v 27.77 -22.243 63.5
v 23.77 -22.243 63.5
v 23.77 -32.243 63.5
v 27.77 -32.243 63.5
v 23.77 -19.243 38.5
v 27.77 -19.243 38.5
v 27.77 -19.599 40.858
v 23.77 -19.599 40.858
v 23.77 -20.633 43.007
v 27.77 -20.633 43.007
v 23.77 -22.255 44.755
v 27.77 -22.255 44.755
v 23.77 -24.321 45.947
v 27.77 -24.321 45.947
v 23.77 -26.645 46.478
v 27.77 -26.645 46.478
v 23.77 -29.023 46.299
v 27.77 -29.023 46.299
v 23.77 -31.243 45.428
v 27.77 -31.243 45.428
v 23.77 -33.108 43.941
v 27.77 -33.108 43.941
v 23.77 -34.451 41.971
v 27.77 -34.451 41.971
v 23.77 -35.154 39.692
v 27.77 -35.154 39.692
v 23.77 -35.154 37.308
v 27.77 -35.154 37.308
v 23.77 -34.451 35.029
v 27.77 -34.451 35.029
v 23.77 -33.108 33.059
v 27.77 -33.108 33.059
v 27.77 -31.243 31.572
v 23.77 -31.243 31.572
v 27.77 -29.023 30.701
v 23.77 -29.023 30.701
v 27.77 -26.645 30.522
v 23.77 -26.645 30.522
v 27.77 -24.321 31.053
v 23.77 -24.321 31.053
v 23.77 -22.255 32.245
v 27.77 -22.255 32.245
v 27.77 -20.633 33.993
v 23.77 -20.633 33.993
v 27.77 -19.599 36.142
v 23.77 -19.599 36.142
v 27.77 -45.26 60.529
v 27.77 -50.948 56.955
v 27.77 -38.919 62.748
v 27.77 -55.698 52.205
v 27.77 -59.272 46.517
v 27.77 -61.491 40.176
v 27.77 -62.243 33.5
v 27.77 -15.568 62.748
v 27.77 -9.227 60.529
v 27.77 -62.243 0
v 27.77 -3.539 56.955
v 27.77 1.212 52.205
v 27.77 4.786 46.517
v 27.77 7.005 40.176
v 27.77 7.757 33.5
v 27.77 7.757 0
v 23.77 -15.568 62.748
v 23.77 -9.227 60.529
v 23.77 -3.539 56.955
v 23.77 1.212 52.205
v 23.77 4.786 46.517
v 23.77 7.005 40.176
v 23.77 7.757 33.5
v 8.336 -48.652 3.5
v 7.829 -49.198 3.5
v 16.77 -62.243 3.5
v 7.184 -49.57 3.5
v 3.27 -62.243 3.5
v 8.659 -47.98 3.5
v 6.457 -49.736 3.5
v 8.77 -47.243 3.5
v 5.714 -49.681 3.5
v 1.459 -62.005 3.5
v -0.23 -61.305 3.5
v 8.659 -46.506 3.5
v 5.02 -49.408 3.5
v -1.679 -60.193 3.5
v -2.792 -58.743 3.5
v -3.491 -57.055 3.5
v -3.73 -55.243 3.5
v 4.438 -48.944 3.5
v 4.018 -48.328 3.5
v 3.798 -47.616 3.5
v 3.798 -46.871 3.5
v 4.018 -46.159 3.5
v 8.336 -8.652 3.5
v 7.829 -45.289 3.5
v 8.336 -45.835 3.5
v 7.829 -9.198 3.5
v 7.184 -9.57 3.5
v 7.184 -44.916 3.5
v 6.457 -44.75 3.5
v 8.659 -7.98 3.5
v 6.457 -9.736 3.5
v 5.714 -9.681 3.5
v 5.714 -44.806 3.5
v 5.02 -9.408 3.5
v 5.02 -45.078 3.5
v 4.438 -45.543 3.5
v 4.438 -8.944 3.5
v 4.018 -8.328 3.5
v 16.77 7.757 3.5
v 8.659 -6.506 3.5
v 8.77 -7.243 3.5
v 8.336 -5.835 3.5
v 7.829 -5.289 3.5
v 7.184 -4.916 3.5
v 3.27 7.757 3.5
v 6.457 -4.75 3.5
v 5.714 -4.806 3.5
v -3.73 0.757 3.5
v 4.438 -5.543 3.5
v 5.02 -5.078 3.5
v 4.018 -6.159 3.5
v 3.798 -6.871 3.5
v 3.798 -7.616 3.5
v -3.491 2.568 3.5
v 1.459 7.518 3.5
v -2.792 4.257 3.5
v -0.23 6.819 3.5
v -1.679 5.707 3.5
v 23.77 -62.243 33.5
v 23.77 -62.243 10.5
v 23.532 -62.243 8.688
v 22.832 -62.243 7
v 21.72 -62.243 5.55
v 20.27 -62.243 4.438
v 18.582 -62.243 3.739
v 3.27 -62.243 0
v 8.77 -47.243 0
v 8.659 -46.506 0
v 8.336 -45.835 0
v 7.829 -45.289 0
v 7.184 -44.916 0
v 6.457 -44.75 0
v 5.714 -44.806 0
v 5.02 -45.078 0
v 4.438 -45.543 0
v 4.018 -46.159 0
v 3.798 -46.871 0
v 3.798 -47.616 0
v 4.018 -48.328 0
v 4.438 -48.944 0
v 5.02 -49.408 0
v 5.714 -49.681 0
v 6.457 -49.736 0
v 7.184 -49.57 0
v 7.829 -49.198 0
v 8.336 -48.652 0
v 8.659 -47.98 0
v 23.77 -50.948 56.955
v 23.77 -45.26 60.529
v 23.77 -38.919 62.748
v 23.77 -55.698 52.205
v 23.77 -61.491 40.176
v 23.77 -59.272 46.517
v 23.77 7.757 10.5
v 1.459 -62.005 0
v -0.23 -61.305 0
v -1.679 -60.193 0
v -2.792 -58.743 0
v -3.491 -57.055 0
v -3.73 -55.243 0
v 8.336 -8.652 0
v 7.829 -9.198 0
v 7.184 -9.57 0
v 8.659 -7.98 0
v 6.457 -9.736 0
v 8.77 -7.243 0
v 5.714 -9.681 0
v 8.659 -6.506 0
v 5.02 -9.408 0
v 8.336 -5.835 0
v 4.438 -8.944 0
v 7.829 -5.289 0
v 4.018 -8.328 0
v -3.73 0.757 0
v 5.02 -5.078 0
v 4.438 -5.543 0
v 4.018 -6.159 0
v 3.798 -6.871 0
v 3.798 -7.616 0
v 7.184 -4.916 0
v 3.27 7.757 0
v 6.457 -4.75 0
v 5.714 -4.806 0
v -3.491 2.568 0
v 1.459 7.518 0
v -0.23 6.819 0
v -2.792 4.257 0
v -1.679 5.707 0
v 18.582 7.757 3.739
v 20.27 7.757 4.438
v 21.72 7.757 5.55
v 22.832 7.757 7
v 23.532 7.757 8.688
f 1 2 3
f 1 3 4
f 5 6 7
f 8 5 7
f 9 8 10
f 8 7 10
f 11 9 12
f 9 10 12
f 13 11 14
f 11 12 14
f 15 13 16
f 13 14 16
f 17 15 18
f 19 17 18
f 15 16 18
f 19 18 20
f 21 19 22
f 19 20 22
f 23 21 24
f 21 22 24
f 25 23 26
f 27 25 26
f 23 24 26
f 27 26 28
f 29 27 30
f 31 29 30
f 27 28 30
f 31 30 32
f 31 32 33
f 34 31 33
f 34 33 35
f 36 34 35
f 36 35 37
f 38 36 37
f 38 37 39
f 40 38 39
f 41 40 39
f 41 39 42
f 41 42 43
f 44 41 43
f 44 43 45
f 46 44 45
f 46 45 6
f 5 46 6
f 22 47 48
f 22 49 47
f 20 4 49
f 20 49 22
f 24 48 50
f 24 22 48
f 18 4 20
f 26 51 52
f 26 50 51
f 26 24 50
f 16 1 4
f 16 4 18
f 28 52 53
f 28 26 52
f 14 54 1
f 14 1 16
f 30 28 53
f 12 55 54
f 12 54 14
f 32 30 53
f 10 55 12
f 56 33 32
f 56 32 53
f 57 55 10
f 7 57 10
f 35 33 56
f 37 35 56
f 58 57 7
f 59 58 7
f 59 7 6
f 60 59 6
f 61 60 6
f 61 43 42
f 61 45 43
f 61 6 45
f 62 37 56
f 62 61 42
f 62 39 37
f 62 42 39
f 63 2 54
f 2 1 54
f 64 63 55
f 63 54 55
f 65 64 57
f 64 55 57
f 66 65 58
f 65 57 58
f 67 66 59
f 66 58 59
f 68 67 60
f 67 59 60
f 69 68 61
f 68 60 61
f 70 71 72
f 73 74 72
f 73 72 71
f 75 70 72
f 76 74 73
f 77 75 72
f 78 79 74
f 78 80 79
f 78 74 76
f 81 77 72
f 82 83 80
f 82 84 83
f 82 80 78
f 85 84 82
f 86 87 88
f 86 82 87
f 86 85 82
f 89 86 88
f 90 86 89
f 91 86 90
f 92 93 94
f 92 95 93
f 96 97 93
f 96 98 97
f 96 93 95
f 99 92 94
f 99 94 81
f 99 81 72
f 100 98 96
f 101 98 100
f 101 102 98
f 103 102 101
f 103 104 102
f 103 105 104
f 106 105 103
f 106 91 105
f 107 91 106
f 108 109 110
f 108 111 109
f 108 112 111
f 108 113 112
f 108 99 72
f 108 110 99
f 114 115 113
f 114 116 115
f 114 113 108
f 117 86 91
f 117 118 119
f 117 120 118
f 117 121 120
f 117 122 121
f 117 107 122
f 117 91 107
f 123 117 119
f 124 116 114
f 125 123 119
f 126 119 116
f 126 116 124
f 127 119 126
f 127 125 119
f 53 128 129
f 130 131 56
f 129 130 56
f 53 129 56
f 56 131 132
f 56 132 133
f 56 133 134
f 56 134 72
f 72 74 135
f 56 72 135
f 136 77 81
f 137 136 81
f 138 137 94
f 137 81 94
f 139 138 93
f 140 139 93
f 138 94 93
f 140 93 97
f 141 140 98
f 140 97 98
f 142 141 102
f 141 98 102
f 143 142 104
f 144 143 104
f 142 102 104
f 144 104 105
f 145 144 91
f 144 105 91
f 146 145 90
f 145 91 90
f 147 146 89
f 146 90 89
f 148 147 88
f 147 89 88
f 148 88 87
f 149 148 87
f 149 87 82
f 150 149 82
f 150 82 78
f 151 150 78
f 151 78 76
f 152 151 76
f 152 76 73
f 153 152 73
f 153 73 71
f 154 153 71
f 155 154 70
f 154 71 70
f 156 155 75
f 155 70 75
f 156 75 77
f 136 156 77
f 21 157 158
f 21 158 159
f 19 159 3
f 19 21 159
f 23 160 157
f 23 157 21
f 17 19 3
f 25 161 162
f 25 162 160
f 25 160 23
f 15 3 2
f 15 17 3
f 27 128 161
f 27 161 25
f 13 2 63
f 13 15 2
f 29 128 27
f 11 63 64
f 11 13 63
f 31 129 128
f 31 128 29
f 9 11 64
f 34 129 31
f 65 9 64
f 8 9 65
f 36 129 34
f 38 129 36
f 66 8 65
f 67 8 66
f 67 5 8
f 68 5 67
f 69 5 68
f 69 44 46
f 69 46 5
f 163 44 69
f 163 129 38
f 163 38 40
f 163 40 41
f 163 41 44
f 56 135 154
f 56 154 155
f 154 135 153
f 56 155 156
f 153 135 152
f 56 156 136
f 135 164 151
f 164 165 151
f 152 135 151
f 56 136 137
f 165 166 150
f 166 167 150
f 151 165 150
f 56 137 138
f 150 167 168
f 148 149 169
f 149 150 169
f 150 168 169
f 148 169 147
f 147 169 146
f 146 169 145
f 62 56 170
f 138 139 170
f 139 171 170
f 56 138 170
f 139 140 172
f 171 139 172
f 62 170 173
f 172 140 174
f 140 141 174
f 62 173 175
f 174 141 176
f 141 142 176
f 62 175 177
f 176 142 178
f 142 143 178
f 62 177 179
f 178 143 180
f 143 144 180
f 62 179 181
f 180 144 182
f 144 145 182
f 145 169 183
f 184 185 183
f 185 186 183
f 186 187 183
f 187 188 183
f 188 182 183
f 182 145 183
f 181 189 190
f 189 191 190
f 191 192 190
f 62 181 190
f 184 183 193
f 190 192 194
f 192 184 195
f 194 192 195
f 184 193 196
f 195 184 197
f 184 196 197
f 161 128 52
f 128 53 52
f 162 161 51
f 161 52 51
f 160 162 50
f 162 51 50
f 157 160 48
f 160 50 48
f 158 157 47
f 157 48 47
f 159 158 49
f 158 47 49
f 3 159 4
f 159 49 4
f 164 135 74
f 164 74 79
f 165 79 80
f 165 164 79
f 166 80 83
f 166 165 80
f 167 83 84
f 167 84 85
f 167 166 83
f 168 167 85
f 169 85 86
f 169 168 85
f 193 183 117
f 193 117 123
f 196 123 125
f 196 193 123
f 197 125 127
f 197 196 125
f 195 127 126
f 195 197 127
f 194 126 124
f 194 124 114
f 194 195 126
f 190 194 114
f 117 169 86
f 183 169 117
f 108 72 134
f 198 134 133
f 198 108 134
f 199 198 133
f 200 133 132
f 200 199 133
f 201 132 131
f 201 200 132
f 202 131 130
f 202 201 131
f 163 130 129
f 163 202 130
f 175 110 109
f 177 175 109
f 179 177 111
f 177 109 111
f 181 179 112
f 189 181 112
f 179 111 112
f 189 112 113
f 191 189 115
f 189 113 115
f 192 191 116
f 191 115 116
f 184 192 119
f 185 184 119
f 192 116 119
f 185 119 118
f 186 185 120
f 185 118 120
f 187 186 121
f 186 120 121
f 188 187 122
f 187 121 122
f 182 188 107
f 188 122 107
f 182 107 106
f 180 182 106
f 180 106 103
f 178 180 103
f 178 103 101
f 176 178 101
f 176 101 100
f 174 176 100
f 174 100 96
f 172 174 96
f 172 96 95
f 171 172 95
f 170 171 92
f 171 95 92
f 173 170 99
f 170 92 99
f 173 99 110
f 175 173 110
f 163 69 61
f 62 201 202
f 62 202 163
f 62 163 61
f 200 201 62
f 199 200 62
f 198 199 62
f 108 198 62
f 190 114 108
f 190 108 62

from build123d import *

# Parameters (mm, degrees)
BOSS_EXTRU_1_DEPTH      = 3.5
ESQUISSE2_R             = 2.5
ENL_V_MAT_EXTRU_1_DEPTH = 3.5
ESQUISSE3_W             = 4
ESQUISSE3_H             = 70
BOSS_EXTRU_2_DEPTH      = 60
ESQUISSE4_R             = 8
ENL_V_MAT_EXTRU_2_DEPTH = 6
CONG_1_R                = 30
ESQUISSE5_W             = 3.5
ESQUISSE5_H             = 70
BOSS_EXTRU_4_DEPTH      = 11.5
CONG_3_R                = 7


with BuildPart() as part:
    # Esquisse1 → Boss.-Extru.1 (new body)
    with BuildSketch(Plane.XY):
        with BuildLine():
            Line((9.27027027, 7.756756757), (16.27027027, 7.756756757))
            Line((16.27027027, 7.756756757), (16.27027027, 0.756756757))
            Line((16.27027027, 0.756756757), (16.27027027, -55.243243243))
            Line((16.27027027, -55.243243243), (16.27027027, -62.243243243))
            Line((16.27027027, -62.243243243), (9.27027027, -62.243243243))
            Line((9.27027027, -62.243243243), (3.27027027, -62.243243243))
            ThreePointArc((3.27027027, -62.243243243), (-1.679477198, -60.192990712), (-3.72972973, -55.243243243))
            Line((-3.72972973, -55.243243243), (-3.72972973, 0.756756757))
            ThreePointArc((-3.72972973, 0.756756757), (-1.679477198, 5.706504225), (3.27027027, 7.756756757))
            Line((3.27027027, 7.756756757), (9.27027027, 7.756756757))
        make_face()
    extrude(amount=BOSS_EXTRU_1_DEPTH)

    # Esquisse2 → Enlèv. mat.-Extru.1 (cut)
    with BuildSketch(Plane.XY.offset(3.5)):
        with Locations((6.27027027, -7.243243243)):
            Circle(ESQUISSE2_R)
        with Locations((6.27027027, -47.243243243)):
            Circle(ESQUISSE2_R)
    extrude(amount=-ENL_V_MAT_EXTRU_1_DEPTH, mode=Mode.SUBTRACT)



with BuildPart() as body_2:
    # Esquisse3 → Boss.-Extru.2 (new body)
    with BuildSketch(Plane.XY.offset(3.5)):
        with Locations((25.77027027, -27.243243243)):
            Rectangle(ESQUISSE3_W, ESQUISSE3_H)
    extrude(amount=BOSS_EXTRU_2_DEPTH)

    # Esquisse4 → Enlèv. mat.-Extru.2 (cut)
    with BuildSketch(Plane(origin=(27.77027027, 0, 0), x_dir=(0, 0, -1), z_dir=(1, 0, 0))):
        with Locations(Location((-38.5, -27.243243243, 0), (0, 0, 90))):
            Circle(ESQUISSE4_R)
    extrude(amount=-ENL_V_MAT_EXTRU_2_DEPTH, mode=Mode.SUBTRACT)

    # Congé1
    cong_1_edges = [body_2.edges().sort_by_distance(p)[0] for p in [
        (25.77027027, 7.756756757, 63.5),
        (25.77027027, -62.243243243, 63.5),
    ]]
    fillet(cong_1_edges, radius=CONG_1_R)


with BuildPart() as part_1:
    add(part.part)

    add(body_2.part)  # Boss.-Extru.4 merges body 2
    # Esquisse5 → Boss.-Extru.4 (add)
    with BuildSketch(Plane(origin=(16.27027027, 0, 0), x_dir=(0, 0, -1), z_dir=(1, 0, 0))):
        with Locations((-1.75, -27.243243243)):
            Rectangle(ESQUISSE5_W, ESQUISSE5_H)
    extrude(amount=BOSS_EXTRU_4_DEPTH)

    # Congé3
    cong_3_edges = [part_1.edges().sort_by_distance(p)[0] for p in [
        (23.77027027, -27.243243243, 3.5),
    ]]
    fillet(cong_3_edges, radius=CONG_3_R)


solid = part_1.part
